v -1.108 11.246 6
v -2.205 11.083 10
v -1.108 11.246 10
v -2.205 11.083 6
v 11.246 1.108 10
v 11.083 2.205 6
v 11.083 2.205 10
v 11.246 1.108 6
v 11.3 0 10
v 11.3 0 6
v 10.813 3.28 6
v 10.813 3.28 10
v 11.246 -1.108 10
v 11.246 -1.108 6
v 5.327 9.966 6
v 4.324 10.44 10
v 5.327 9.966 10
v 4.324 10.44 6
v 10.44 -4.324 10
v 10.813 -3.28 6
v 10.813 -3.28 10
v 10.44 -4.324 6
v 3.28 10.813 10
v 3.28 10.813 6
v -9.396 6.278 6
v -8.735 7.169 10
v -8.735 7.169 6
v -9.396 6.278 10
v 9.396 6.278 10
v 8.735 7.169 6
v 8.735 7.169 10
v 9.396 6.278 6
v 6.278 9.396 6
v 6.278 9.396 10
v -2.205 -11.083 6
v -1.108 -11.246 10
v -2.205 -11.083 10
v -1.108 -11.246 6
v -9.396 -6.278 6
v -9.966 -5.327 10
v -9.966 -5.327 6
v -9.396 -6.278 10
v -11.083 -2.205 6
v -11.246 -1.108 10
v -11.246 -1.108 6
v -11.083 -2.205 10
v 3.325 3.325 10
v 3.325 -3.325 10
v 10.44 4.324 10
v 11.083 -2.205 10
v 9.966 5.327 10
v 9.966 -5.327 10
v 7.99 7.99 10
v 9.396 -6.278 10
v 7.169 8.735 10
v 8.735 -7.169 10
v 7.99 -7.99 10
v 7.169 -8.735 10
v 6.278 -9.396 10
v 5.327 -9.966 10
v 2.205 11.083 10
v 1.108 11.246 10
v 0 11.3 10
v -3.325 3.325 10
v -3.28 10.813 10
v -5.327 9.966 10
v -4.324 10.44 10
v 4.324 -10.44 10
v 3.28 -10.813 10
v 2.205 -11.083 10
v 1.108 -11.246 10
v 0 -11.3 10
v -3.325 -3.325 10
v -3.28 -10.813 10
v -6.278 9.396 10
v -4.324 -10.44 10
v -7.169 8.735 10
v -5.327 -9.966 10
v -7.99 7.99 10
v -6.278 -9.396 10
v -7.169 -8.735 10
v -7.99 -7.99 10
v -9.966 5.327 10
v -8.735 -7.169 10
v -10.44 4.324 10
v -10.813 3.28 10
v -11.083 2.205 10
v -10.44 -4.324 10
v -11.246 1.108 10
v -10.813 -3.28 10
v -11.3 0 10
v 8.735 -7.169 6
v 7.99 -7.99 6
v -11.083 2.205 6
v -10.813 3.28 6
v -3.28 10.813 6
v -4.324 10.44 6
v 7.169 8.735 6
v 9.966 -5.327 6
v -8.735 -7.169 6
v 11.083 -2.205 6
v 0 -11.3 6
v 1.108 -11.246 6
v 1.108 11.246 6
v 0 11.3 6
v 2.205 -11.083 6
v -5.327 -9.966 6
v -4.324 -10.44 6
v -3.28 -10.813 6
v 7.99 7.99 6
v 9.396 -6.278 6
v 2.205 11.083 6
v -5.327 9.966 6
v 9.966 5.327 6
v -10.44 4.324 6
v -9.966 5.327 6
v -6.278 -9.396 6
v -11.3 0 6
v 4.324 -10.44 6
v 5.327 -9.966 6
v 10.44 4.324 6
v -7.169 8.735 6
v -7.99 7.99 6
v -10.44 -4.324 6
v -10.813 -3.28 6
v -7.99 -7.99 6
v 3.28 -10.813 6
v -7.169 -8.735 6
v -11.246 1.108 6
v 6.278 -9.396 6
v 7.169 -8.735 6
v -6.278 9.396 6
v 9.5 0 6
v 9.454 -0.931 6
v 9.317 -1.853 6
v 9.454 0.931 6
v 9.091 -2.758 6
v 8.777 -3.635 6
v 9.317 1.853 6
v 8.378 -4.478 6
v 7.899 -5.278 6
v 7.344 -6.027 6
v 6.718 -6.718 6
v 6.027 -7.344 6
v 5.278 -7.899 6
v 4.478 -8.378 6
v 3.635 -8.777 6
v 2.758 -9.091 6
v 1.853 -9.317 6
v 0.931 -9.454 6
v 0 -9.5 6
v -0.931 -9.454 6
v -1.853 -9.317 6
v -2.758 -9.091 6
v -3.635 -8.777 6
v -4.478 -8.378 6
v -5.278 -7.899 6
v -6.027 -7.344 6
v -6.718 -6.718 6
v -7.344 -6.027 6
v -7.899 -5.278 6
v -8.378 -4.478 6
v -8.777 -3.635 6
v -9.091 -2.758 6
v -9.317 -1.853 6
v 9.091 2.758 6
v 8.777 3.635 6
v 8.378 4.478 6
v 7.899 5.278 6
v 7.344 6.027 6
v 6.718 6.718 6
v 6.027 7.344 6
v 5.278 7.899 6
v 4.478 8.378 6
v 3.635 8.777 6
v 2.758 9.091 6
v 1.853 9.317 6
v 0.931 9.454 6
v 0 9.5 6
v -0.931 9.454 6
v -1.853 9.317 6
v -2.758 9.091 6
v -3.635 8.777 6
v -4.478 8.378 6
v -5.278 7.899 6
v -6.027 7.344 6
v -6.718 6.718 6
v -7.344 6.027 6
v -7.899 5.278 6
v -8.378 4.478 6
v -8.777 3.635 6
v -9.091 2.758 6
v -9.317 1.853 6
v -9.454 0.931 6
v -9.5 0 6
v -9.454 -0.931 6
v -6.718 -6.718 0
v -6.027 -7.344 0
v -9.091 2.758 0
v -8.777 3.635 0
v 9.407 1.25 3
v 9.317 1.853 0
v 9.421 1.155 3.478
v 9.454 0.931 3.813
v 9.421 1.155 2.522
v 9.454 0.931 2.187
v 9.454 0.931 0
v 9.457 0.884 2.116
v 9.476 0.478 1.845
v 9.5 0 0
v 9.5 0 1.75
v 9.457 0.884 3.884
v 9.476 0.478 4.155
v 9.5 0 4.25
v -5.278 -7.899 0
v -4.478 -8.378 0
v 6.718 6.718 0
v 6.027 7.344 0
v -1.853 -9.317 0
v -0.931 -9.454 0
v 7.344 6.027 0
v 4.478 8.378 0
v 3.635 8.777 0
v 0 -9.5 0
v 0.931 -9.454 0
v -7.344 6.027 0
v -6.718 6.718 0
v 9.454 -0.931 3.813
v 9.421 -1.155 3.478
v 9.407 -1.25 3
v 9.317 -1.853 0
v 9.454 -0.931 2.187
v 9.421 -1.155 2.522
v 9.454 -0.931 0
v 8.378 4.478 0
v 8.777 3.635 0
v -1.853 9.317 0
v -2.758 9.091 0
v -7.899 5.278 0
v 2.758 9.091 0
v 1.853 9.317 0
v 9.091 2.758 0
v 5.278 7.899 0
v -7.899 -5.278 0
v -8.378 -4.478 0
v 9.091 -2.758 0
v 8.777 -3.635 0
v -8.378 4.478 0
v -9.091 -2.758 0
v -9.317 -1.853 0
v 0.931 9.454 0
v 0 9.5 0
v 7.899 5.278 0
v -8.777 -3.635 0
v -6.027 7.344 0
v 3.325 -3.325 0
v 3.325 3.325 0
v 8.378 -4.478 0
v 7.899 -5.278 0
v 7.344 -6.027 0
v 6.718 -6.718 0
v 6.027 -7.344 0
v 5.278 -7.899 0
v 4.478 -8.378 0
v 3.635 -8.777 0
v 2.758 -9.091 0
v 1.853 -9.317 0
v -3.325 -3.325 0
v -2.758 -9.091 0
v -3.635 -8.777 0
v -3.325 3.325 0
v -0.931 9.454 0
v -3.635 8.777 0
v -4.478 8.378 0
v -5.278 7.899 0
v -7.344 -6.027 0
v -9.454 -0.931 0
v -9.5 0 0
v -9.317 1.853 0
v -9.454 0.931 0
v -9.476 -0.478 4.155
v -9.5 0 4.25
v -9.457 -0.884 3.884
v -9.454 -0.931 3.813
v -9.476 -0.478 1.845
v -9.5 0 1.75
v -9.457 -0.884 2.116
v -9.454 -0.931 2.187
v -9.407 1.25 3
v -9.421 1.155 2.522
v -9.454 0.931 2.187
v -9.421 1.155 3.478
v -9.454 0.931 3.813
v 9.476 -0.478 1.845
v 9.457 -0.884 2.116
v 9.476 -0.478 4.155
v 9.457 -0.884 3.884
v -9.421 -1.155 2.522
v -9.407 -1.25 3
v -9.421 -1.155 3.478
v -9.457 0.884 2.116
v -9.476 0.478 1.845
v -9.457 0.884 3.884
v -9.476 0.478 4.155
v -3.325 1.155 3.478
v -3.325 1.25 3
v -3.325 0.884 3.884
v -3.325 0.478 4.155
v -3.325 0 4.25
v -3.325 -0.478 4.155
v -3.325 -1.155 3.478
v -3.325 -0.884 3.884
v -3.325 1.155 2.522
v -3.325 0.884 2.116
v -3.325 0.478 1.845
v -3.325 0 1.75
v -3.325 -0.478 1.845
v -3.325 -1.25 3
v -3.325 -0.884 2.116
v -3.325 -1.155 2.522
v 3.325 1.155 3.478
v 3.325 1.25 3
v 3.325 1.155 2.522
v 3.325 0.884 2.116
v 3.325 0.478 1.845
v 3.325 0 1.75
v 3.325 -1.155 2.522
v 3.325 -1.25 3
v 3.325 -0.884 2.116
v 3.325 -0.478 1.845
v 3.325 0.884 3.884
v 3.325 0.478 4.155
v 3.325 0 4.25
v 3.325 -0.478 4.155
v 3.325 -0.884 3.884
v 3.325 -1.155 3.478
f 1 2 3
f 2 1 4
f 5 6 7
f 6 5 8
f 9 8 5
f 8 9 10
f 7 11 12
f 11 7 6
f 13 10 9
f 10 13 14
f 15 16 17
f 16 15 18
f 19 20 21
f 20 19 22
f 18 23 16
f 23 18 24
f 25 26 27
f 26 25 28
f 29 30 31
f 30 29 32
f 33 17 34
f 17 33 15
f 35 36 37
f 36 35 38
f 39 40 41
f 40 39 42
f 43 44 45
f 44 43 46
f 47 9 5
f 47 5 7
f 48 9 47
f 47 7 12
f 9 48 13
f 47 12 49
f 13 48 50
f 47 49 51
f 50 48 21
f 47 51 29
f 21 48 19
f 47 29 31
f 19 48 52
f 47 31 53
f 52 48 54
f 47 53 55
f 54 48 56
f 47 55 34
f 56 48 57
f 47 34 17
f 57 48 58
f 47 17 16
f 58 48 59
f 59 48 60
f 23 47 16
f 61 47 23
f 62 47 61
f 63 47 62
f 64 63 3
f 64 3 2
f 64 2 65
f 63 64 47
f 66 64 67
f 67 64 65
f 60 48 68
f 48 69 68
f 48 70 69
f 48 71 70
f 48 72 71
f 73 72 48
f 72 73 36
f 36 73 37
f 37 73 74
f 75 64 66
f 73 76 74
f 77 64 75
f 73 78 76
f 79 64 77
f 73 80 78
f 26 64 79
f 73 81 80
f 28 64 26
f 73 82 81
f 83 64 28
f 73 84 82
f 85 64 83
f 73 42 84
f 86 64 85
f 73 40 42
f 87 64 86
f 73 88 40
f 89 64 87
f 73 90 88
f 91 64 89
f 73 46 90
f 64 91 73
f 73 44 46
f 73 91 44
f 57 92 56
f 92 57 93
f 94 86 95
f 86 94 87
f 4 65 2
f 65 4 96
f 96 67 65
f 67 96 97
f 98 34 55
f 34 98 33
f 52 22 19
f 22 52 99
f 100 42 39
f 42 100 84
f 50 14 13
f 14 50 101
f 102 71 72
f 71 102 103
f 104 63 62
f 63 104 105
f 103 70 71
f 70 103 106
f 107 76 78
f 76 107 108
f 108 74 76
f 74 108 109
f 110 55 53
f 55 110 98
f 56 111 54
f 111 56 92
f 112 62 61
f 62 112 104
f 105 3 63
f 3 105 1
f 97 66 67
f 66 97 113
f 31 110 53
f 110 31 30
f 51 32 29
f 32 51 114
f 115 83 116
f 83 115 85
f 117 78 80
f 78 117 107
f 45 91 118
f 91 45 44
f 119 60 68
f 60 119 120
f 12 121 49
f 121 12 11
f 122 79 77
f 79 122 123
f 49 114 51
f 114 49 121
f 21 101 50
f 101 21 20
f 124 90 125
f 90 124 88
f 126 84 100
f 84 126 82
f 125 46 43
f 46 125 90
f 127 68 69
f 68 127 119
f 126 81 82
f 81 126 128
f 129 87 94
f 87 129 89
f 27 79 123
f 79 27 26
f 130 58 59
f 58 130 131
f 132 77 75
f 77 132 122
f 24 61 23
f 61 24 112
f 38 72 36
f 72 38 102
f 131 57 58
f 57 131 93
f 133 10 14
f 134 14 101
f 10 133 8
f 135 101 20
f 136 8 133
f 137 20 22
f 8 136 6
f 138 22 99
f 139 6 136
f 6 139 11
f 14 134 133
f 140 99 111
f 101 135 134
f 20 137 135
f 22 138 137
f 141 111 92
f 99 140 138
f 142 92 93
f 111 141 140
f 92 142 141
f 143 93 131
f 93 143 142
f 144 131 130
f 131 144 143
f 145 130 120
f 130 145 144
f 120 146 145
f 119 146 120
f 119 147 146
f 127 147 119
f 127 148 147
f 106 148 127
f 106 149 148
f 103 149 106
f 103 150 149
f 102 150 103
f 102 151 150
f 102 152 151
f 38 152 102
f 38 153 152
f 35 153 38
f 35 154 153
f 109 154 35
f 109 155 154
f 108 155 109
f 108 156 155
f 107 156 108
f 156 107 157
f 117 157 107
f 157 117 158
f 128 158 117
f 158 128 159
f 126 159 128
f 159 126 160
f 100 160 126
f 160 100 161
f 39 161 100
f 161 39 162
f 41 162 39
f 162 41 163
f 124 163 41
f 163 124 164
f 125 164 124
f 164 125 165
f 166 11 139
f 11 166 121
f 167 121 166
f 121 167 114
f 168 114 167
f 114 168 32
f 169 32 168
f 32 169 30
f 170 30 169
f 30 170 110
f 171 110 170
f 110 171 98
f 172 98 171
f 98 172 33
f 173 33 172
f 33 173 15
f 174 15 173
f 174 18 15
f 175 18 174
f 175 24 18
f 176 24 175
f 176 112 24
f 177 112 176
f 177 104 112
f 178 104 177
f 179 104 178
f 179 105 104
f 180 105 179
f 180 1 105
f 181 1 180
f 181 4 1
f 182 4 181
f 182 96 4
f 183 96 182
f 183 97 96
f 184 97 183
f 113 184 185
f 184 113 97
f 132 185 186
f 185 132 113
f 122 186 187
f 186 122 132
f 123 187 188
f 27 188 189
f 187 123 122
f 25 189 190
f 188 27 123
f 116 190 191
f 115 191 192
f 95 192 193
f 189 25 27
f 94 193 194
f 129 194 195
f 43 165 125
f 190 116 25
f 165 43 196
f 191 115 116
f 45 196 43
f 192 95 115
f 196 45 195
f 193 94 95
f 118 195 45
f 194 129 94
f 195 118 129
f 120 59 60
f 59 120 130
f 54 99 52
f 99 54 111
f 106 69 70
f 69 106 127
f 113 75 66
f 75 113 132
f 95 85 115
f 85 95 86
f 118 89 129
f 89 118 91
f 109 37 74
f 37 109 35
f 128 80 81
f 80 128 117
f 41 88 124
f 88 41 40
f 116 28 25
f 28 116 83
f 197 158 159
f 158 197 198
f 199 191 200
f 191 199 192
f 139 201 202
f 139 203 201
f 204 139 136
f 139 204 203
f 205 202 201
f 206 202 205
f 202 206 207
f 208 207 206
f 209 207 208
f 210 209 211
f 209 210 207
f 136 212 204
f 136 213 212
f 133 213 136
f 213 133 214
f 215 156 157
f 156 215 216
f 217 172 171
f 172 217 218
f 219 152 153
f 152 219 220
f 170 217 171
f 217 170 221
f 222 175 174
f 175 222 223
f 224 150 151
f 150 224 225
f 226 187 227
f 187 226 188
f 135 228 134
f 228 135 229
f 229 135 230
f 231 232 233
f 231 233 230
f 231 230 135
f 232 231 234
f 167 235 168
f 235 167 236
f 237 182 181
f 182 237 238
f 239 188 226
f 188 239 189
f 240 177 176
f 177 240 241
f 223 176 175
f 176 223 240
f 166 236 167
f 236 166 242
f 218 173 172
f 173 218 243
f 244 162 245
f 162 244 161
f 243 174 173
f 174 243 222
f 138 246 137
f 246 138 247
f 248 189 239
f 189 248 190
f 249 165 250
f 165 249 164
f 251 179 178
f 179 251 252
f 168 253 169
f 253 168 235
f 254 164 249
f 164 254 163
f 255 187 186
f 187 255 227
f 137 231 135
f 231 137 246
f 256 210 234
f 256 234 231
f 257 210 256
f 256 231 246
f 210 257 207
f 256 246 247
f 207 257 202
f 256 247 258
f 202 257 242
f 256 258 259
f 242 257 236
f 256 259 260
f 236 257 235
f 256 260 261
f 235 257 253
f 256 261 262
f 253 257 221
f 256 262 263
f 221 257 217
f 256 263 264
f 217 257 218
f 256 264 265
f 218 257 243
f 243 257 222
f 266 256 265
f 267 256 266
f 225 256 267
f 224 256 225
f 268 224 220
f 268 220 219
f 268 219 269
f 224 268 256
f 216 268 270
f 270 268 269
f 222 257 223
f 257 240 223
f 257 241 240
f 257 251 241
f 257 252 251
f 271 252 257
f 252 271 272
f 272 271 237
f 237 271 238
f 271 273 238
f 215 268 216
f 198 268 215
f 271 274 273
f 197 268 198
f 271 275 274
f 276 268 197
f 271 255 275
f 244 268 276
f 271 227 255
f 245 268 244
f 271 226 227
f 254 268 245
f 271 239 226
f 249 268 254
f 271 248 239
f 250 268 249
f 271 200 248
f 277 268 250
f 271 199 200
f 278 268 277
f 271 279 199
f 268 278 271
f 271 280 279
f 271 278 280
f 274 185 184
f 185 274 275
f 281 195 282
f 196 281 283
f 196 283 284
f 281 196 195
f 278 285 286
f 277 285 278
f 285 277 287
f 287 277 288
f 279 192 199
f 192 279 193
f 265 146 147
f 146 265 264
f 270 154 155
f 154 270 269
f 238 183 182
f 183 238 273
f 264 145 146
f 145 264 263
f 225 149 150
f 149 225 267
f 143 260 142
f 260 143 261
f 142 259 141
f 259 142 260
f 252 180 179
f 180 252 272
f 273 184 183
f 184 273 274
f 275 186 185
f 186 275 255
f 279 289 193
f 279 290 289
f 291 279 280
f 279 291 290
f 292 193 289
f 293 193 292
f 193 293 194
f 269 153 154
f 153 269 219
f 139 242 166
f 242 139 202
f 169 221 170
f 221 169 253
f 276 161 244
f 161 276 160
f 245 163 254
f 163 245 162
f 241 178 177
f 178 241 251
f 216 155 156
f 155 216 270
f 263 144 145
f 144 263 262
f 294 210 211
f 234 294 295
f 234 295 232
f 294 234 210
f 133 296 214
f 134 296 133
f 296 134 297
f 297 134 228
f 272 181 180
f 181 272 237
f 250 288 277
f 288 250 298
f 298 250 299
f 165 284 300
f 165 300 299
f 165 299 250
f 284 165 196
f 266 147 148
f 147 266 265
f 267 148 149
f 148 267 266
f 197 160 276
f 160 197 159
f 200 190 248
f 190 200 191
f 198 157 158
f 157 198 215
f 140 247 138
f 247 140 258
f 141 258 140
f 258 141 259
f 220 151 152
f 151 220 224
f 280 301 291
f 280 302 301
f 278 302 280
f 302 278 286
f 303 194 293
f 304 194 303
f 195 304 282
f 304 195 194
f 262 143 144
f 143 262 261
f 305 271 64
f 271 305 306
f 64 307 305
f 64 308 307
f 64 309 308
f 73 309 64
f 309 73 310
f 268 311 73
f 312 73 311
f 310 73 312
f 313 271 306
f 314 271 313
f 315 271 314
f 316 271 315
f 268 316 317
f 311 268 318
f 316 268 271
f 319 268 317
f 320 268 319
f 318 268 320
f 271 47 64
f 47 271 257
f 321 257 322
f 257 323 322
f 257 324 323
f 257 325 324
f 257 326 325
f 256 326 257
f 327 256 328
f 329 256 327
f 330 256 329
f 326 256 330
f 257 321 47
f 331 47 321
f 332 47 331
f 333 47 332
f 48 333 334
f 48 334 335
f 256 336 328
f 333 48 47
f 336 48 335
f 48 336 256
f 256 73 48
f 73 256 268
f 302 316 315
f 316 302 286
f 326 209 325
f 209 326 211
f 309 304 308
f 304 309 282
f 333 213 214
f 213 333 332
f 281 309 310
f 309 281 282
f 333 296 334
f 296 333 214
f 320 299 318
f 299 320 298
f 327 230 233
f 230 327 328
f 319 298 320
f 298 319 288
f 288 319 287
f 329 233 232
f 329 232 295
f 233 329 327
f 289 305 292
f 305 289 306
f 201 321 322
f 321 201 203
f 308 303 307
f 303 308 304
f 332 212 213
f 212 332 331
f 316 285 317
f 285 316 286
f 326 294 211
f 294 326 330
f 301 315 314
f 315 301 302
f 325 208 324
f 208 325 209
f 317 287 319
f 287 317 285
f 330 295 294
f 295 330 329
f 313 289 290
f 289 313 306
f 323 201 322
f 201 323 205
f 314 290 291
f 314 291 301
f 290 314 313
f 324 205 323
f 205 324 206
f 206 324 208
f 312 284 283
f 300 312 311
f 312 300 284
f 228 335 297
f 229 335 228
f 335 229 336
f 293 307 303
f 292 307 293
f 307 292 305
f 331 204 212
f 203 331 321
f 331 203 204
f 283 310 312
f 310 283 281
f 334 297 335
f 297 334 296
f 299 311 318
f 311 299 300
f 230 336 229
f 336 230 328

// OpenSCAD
/* ==========================================================
   BUJE-ACOPLE INTEGRADO (DUMMY BEARING + ADAPTER)
   ----------------------------------------------------------
   Sustituye al rodamiento 6703 Y al adaptador en UNA pieza.
   ¡SÓLO PARA PRUEBAS DE MOVIMIENTO EN VACÍO!
   ========================================================== */

square_shaft_side = 6.35; // 1/4" de pulgada
square_clearance = 0.3;   // Tolerancia FDM para que la varilla entre suave
$fn = 64;

module buje_acople_integrado() {
    difference() {
        union() {
            // 1. EL RODAMIENTO (La parte ancha)
            // Diámetro 22.6mm (El agujero en la placa es de 23.05mm). 
            // Ese casi medio milímetro de holgura hará que gire libre sin rozar.
            translate([0, 0, 6]) cylinder(d=22.6, h=4);
            
            // Chaflán sutil para evitar el "pie de elefante" al imprimir
            translate([0, 0, 6]) cylinder(d1=21.6, d2=22.6, h=0.5);
            
            // 2. EL CUELLO DEL ACOPLE (Donde va el tornillo)
            // Diámetro 19mm. Queda expuesto fuera de la placa para meter la llave Allen
            cylinder(d=19, h=6);
        }
        
        // 3. EL HUECO CUADRADO (Para el eje de 1/4")
        s = square_shaft_side + square_clearance; 
        translate([0,0,-1]) linear_extrude(12) square([s, s], center=true);
        
        // 4. AGUJERO DEL PRISIONERO M3
        // Diámetro 2.5mm para que el tornillo M3 de acero tale su propia rosca
        translate([0, 0, 3]) rotate([0, 90, 0]) cylinder(d=2.5, h=40, center=true, $fn=16);
    }
}

// Render para exportar
color("gold") buje_acople_integrado();
